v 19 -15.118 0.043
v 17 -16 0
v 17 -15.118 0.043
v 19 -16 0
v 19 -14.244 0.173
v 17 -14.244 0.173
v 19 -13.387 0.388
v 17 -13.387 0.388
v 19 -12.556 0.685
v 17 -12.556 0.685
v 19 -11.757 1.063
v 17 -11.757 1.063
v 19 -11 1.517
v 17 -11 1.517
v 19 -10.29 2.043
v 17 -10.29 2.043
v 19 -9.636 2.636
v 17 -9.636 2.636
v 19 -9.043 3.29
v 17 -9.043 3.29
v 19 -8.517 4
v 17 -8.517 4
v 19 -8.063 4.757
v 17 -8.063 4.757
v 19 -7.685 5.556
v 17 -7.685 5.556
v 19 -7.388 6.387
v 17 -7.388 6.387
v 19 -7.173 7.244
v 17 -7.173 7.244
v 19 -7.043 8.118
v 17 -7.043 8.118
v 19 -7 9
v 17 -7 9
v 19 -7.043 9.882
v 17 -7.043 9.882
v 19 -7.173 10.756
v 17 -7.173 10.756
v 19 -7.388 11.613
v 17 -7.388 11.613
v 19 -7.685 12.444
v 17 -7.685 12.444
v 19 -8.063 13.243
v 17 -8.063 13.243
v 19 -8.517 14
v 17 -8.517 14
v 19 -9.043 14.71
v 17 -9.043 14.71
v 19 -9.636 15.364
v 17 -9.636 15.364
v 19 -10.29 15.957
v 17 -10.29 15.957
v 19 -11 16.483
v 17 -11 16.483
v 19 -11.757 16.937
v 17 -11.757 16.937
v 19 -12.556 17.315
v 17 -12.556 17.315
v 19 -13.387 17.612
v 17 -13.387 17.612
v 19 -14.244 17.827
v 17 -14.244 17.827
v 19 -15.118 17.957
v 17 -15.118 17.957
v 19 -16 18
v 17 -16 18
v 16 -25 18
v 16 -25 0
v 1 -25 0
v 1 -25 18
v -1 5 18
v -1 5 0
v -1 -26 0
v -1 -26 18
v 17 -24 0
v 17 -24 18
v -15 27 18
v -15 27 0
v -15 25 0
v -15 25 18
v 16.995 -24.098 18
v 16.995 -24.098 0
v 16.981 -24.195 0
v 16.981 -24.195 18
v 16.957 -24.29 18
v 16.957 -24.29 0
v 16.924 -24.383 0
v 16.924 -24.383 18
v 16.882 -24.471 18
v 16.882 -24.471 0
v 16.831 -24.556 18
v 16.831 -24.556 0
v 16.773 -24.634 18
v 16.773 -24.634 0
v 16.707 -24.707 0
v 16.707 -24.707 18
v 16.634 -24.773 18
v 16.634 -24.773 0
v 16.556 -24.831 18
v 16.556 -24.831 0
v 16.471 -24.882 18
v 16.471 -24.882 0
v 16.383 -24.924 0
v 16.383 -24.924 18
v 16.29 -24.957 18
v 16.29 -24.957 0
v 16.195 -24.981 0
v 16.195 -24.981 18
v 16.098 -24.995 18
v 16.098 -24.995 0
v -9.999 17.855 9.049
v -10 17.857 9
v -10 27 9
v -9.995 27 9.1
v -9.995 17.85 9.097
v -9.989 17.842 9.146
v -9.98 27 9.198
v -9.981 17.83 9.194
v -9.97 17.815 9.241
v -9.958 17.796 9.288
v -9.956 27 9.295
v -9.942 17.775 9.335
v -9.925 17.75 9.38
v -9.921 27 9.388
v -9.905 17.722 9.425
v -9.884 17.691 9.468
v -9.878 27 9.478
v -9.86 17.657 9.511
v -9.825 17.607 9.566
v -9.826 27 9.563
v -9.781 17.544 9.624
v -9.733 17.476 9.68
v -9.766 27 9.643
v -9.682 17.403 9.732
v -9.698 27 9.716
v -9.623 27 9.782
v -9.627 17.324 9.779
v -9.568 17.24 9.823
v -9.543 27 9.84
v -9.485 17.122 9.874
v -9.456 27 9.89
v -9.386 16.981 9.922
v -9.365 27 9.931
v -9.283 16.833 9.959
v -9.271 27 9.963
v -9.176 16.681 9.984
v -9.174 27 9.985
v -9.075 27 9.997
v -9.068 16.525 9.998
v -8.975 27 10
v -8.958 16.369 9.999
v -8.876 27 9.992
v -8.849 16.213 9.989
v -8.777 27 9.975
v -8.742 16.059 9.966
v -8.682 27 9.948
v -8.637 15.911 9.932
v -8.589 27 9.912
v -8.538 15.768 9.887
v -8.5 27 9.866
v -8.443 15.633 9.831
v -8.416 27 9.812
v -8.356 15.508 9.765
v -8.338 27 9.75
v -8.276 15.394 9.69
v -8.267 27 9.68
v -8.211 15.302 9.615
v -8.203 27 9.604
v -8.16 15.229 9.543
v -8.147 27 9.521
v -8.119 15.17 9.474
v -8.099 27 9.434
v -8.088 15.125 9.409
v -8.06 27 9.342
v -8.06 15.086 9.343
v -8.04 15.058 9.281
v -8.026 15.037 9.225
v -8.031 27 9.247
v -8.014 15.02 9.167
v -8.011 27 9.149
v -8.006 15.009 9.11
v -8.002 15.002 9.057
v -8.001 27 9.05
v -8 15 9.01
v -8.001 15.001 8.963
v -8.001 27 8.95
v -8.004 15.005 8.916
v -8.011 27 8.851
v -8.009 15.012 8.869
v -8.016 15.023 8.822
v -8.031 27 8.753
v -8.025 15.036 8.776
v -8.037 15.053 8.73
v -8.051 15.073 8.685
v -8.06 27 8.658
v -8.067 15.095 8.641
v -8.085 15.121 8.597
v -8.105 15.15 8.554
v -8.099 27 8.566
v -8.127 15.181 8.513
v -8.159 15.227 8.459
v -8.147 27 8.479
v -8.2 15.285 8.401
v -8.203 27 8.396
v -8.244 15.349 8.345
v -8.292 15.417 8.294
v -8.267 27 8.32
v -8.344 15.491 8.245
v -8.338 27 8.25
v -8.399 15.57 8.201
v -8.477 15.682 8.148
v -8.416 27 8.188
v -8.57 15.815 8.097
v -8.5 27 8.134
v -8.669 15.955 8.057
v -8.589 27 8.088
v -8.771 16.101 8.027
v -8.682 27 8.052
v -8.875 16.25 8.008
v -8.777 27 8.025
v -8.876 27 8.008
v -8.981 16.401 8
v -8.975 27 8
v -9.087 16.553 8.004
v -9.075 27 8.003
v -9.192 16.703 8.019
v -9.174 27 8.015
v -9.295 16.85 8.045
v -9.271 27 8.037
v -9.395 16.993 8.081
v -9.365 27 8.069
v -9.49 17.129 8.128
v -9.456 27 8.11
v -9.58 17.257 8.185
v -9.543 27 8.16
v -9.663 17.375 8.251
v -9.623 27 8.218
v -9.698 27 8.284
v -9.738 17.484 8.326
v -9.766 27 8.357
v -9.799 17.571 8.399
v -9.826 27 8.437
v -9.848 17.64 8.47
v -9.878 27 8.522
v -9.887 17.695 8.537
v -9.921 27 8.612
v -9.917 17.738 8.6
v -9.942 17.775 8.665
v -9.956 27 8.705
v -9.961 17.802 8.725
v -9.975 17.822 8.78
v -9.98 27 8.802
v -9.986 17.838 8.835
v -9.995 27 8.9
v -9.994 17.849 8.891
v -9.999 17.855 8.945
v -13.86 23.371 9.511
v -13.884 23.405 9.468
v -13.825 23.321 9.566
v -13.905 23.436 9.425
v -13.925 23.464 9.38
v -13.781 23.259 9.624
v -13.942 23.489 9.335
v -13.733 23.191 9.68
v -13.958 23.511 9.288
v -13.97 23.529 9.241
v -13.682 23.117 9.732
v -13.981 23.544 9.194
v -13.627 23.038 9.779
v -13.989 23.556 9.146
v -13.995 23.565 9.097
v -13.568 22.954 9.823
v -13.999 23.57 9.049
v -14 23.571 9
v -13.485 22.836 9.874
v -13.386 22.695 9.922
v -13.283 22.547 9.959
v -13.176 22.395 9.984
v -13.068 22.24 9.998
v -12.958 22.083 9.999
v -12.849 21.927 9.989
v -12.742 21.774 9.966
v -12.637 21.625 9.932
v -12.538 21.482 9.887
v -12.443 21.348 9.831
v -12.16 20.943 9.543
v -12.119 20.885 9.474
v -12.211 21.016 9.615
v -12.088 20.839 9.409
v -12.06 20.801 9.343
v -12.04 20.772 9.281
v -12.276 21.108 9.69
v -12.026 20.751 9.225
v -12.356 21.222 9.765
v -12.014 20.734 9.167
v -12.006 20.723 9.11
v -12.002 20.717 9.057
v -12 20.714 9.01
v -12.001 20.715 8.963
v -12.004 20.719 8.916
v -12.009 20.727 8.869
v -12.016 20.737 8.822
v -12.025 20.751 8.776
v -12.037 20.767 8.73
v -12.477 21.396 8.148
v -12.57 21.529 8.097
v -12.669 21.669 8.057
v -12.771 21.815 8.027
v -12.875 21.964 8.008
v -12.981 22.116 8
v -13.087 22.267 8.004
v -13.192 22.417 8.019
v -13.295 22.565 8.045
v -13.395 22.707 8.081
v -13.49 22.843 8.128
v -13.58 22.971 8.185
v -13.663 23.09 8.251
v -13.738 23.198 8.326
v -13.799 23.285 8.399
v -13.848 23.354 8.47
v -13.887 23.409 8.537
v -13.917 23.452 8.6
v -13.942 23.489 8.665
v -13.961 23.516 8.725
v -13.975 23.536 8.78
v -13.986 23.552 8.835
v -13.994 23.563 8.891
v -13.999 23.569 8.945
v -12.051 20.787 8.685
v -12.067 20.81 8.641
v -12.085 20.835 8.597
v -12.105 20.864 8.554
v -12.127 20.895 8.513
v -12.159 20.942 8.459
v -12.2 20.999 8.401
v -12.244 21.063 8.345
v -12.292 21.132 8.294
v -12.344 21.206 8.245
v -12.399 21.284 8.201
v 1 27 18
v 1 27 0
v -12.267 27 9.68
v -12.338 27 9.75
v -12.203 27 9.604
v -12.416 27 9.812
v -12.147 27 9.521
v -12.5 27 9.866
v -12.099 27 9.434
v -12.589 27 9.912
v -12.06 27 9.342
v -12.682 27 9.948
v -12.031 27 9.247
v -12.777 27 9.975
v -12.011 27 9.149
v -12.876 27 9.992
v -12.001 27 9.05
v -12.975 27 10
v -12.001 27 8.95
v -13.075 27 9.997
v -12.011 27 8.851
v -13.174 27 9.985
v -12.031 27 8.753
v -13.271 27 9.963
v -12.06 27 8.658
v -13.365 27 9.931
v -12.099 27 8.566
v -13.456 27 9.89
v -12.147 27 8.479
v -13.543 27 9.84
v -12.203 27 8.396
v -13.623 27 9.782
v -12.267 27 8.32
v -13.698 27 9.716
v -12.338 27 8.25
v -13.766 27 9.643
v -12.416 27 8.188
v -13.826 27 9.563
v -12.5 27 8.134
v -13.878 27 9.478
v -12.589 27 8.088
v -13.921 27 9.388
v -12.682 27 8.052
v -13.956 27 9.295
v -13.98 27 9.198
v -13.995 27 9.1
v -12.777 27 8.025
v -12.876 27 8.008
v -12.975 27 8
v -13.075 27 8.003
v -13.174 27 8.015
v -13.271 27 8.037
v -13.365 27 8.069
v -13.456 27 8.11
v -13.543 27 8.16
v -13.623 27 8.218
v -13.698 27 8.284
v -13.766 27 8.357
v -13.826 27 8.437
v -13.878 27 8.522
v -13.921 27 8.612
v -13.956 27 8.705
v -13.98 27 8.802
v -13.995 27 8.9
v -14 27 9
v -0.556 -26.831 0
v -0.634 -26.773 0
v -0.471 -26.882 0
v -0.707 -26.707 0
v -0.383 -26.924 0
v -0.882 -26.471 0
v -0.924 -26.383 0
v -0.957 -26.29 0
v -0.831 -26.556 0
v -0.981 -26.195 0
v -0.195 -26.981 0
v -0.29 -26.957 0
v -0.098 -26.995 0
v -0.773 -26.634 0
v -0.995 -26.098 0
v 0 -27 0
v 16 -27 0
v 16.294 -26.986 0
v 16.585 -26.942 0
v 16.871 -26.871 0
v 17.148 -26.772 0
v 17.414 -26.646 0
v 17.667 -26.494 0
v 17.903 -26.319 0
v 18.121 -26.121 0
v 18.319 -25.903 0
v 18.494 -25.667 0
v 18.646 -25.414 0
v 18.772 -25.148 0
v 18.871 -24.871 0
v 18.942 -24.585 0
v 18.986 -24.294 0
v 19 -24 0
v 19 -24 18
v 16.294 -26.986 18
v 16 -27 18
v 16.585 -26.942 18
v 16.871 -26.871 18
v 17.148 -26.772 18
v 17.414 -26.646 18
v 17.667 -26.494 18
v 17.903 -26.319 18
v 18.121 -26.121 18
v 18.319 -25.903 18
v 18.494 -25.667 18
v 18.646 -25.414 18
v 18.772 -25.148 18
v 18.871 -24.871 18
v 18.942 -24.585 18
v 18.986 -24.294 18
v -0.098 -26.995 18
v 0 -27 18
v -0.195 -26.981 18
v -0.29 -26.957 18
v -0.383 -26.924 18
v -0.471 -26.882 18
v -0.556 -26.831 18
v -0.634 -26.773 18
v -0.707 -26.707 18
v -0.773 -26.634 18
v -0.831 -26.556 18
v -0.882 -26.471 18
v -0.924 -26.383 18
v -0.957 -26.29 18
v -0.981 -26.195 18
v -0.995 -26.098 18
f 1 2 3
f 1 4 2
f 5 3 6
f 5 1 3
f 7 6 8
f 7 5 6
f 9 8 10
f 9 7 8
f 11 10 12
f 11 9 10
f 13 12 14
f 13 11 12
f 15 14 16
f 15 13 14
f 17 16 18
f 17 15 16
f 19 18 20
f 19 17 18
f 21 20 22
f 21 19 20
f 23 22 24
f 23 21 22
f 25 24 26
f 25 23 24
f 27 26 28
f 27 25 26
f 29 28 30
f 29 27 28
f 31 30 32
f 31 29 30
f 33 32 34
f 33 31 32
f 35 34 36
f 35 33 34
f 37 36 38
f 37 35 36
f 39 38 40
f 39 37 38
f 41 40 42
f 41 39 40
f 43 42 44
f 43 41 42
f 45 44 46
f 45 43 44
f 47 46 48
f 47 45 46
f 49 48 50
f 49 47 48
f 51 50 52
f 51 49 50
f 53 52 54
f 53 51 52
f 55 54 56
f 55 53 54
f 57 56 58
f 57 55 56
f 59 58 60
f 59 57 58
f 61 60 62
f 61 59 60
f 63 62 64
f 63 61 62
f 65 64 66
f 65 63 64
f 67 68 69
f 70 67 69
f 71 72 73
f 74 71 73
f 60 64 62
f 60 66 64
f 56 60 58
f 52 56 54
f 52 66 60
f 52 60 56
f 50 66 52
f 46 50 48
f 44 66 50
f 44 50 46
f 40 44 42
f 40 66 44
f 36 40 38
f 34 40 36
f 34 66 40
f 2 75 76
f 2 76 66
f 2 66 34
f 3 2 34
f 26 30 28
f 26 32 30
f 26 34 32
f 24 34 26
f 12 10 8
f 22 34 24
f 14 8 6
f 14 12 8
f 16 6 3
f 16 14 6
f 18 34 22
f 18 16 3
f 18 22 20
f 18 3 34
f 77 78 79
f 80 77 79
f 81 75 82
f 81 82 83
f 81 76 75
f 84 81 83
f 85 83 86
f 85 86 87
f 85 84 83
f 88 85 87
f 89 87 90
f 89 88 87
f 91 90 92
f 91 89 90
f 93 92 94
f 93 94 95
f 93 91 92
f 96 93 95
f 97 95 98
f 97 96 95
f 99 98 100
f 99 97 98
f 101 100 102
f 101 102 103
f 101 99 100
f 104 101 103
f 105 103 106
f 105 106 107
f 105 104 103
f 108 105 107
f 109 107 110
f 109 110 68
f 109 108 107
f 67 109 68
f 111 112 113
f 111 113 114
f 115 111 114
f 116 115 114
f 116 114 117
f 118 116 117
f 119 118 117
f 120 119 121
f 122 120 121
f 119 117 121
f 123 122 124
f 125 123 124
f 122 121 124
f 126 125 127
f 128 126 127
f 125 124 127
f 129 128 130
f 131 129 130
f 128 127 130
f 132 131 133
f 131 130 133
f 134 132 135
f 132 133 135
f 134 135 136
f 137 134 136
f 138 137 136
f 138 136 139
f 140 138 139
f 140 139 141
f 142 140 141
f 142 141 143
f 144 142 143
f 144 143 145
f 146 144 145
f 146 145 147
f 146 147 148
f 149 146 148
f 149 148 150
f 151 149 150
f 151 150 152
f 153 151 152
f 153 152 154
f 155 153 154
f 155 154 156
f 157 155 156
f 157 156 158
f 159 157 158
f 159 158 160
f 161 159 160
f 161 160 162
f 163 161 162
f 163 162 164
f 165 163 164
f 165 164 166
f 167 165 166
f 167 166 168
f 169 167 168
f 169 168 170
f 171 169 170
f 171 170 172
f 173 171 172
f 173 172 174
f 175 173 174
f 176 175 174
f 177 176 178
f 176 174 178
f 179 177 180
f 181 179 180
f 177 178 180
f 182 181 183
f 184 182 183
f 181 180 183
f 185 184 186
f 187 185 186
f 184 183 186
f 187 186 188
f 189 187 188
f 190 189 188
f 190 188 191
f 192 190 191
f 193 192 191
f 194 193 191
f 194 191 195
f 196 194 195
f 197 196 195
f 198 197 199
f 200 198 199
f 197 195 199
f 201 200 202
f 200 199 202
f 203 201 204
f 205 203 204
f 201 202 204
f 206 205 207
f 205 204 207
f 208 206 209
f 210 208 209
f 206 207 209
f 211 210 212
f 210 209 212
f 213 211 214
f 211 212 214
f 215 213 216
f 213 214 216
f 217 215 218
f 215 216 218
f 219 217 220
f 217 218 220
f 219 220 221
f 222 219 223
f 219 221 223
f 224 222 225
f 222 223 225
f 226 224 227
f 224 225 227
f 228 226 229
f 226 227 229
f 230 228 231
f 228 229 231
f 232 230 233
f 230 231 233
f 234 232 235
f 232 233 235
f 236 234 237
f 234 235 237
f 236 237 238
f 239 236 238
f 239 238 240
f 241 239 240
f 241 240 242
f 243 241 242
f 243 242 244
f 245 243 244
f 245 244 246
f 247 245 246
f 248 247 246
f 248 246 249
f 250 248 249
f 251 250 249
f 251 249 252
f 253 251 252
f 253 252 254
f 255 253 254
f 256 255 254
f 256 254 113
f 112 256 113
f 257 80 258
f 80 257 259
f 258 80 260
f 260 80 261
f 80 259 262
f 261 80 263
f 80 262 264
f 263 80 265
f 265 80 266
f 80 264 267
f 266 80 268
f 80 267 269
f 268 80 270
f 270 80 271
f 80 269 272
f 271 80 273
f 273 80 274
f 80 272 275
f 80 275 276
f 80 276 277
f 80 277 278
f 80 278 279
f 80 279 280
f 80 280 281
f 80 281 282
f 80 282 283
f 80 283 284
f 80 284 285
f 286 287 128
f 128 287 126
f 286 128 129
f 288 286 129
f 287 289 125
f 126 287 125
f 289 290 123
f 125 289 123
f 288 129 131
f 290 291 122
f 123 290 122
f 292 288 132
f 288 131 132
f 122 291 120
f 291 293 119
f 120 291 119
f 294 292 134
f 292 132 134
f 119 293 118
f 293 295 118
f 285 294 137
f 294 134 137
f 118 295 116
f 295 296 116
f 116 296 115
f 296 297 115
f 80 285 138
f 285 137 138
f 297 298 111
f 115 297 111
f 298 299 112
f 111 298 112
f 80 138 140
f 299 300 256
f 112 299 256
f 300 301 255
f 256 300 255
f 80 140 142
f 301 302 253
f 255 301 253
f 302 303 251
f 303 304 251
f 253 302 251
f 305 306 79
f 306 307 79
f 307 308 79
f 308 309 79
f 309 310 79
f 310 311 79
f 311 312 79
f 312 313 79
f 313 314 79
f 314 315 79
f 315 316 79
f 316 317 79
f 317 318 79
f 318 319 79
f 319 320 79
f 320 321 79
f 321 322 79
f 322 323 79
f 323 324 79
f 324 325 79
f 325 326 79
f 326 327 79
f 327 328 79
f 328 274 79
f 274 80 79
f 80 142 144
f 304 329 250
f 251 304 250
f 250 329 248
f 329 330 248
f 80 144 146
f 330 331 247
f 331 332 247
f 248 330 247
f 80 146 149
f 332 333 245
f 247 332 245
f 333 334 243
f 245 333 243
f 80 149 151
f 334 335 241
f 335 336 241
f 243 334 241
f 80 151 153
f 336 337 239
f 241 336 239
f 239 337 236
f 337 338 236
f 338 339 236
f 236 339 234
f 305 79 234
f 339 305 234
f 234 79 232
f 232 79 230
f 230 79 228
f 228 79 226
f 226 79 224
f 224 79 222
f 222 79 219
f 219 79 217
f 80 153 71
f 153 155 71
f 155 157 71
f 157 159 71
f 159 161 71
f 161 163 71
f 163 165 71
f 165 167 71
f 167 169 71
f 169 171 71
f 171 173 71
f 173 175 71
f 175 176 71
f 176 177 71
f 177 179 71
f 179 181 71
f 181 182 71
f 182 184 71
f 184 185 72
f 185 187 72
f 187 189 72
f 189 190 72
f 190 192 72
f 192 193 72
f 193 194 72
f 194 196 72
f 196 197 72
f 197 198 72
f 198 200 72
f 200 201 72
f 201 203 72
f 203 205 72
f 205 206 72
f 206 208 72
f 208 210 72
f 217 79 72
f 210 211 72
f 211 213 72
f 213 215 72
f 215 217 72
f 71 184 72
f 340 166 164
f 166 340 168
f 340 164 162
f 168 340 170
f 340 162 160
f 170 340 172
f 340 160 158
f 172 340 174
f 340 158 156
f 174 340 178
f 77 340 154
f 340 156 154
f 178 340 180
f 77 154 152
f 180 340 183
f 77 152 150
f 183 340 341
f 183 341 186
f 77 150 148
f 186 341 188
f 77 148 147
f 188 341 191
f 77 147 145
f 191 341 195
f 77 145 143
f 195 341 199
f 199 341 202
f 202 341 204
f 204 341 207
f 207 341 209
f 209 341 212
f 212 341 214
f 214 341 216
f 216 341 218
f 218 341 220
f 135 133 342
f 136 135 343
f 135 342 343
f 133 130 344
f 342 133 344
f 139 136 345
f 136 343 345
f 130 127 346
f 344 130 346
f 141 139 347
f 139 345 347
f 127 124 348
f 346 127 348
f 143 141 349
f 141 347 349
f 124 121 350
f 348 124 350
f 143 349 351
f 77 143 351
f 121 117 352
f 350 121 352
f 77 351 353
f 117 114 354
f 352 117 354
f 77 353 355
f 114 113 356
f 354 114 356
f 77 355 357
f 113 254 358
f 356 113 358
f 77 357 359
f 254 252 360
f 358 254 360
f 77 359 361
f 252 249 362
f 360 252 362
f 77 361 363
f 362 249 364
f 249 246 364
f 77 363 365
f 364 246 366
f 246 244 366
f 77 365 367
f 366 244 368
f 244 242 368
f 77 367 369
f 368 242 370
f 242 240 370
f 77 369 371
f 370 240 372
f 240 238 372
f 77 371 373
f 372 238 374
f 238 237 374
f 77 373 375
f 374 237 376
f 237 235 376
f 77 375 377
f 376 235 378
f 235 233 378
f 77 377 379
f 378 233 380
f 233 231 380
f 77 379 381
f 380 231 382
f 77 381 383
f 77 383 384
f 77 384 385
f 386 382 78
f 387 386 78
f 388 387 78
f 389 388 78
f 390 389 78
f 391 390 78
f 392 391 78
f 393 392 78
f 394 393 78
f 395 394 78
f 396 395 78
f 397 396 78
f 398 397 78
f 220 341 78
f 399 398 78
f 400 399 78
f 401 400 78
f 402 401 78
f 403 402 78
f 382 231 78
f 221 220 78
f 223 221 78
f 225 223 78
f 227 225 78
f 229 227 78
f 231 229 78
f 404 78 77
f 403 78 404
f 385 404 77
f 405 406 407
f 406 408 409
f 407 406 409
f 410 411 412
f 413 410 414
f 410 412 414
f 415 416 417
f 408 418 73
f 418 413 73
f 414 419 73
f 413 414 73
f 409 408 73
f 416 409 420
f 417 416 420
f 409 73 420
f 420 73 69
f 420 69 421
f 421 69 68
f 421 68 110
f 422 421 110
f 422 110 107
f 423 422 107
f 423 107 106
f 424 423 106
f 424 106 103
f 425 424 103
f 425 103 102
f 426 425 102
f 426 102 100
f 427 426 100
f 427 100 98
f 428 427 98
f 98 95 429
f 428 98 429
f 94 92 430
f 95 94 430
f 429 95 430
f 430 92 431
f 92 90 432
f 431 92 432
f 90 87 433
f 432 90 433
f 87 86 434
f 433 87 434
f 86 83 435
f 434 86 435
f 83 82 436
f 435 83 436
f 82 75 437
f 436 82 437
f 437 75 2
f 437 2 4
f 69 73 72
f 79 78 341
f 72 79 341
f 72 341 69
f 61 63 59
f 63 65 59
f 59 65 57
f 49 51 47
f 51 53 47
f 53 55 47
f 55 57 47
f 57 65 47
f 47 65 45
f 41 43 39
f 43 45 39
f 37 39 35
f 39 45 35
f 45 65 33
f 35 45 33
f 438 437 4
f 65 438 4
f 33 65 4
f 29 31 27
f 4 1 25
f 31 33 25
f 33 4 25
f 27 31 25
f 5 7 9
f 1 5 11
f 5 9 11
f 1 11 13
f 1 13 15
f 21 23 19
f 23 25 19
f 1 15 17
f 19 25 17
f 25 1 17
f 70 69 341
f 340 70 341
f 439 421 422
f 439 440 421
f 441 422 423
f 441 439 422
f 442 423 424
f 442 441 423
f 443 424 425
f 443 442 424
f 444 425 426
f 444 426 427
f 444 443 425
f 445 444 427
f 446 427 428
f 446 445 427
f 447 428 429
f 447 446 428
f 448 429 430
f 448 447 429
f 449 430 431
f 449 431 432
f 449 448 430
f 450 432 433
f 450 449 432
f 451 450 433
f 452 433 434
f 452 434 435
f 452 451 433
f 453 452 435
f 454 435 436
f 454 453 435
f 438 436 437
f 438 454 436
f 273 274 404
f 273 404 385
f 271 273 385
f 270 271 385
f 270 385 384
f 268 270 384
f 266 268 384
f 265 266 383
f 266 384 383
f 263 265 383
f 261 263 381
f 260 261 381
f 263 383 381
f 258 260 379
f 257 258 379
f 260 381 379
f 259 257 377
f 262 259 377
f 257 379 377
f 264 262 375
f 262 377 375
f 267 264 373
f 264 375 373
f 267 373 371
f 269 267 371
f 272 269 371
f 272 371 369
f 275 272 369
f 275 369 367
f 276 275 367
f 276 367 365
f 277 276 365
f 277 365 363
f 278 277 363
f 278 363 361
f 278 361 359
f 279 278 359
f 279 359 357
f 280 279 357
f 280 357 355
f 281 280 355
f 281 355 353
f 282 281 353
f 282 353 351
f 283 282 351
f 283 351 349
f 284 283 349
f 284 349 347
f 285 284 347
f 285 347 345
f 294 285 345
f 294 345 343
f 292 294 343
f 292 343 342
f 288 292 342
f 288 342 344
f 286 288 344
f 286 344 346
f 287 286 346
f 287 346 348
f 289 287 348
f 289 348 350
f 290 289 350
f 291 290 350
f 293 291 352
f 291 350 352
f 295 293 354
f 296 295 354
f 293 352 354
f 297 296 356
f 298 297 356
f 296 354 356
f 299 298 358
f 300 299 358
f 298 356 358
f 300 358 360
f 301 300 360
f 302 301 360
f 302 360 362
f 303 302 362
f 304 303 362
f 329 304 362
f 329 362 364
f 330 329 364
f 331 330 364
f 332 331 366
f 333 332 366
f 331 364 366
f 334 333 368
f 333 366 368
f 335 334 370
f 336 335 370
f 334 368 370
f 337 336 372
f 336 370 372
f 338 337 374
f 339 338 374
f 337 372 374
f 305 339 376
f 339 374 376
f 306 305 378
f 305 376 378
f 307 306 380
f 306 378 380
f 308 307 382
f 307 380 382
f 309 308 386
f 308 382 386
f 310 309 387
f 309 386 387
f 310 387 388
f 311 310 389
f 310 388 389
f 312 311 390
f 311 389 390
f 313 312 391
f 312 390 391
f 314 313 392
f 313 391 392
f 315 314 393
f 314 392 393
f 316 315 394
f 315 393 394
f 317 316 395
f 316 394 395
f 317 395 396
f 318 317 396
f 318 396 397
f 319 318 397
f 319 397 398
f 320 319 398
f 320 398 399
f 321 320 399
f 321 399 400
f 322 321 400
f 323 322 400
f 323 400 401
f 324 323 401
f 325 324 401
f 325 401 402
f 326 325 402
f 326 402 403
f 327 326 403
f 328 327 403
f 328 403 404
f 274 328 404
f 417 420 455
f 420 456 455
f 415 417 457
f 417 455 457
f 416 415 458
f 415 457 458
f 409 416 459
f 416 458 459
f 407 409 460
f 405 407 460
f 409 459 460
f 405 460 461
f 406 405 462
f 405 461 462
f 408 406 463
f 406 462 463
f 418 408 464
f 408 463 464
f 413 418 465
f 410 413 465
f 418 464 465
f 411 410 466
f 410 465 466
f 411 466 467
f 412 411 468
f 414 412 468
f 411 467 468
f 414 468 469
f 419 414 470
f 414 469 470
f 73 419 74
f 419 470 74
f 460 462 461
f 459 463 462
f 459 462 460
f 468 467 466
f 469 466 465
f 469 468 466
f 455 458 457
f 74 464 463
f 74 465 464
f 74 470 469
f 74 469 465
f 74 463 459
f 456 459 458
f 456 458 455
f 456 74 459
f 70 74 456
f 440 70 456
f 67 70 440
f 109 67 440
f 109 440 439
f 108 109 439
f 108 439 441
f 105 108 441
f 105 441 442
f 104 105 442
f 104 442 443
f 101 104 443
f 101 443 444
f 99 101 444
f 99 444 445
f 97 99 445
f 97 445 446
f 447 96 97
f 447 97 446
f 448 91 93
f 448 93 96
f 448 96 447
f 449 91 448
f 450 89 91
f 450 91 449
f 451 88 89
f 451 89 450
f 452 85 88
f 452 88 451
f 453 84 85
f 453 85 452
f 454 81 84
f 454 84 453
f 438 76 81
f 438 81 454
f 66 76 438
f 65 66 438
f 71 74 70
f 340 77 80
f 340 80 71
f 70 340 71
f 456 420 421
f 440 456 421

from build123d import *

# Parameters (mm, degrees)
F0_W     = 2
F0_H     = 18
F1_DEPTH = 18
F2_R     = 1
F3_DEPTH = 25
F4_R     = 3
F5_R     = 1
F6_R     = 1
F7_R     = 8.99999


# Not quite as in the source:
# - a fillet or chamfer is up to 0.001 mm smaller than in the source, because OpenCascade refuses the exact size


with BuildPart() as f1:
    # F0 (on Top) → F1 (new body)
    with BuildSketch(Plane.XY):
        Polygon((-1, 5), (-1, -25), (1, -25), (1, 25), (-1, 25), align=None)
        Polygon((1, -25), (-1, -25), (-1, -27), (19, -27), (19, -25), (17, -25), align=None)
        Polygon((-15, 25), (-1, 5), (-1, 25), align=None)
        Polygon((-1, 25), (1, 25), (1, 27), (-15, 27), (-15, 25), align=None)
        with Locations((18, -16)):
            Rectangle(F0_W, F0_H)
    extrude(amount=F1_DEPTH)

    # F2 (on face) → F3 (cut)
    with BuildSketch(Plane(origin=(0, 27, 0), x_dir=(-1, 0, 0), z_dir=(0, 1, 0))):
        with Locations((9, 9)):
            Circle(F2_R)
        with Locations((13, 9)):
            Circle(F2_R)
    extrude(amount=-F3_DEPTH, mode=Mode.SUBTRACT)

    # F4
    f4_edges = [f1.edges().sort_by_distance(p)[0] for p in [
        (19, -27, 9),
    ]]
    fillet(f4_edges, radius=F4_R)

    # F5
    f5_edges = [f1.edges().sort_by_distance(p)[0] for p in [
        (17, -25, 9),
    ]]
    fillet(f5_edges, radius=F5_R)

    # F6
    f6_edges = [f1.edges().sort_by_distance(p)[0] for p in [
        (-1, -27, 9),
    ]]
    fillet(f6_edges, radius=F6_R)

    # F7 (radius 9 in the source; OpenCascade refuses exactly that, so slightly less here)
    f7_edges = [f1.edges().sort_by_distance(p)[0] for p in [
        (18, -7, 18),
        (18, -7, 0),
    ]]
    fillet(f7_edges, radius=F7_R)


solid = f1.part
